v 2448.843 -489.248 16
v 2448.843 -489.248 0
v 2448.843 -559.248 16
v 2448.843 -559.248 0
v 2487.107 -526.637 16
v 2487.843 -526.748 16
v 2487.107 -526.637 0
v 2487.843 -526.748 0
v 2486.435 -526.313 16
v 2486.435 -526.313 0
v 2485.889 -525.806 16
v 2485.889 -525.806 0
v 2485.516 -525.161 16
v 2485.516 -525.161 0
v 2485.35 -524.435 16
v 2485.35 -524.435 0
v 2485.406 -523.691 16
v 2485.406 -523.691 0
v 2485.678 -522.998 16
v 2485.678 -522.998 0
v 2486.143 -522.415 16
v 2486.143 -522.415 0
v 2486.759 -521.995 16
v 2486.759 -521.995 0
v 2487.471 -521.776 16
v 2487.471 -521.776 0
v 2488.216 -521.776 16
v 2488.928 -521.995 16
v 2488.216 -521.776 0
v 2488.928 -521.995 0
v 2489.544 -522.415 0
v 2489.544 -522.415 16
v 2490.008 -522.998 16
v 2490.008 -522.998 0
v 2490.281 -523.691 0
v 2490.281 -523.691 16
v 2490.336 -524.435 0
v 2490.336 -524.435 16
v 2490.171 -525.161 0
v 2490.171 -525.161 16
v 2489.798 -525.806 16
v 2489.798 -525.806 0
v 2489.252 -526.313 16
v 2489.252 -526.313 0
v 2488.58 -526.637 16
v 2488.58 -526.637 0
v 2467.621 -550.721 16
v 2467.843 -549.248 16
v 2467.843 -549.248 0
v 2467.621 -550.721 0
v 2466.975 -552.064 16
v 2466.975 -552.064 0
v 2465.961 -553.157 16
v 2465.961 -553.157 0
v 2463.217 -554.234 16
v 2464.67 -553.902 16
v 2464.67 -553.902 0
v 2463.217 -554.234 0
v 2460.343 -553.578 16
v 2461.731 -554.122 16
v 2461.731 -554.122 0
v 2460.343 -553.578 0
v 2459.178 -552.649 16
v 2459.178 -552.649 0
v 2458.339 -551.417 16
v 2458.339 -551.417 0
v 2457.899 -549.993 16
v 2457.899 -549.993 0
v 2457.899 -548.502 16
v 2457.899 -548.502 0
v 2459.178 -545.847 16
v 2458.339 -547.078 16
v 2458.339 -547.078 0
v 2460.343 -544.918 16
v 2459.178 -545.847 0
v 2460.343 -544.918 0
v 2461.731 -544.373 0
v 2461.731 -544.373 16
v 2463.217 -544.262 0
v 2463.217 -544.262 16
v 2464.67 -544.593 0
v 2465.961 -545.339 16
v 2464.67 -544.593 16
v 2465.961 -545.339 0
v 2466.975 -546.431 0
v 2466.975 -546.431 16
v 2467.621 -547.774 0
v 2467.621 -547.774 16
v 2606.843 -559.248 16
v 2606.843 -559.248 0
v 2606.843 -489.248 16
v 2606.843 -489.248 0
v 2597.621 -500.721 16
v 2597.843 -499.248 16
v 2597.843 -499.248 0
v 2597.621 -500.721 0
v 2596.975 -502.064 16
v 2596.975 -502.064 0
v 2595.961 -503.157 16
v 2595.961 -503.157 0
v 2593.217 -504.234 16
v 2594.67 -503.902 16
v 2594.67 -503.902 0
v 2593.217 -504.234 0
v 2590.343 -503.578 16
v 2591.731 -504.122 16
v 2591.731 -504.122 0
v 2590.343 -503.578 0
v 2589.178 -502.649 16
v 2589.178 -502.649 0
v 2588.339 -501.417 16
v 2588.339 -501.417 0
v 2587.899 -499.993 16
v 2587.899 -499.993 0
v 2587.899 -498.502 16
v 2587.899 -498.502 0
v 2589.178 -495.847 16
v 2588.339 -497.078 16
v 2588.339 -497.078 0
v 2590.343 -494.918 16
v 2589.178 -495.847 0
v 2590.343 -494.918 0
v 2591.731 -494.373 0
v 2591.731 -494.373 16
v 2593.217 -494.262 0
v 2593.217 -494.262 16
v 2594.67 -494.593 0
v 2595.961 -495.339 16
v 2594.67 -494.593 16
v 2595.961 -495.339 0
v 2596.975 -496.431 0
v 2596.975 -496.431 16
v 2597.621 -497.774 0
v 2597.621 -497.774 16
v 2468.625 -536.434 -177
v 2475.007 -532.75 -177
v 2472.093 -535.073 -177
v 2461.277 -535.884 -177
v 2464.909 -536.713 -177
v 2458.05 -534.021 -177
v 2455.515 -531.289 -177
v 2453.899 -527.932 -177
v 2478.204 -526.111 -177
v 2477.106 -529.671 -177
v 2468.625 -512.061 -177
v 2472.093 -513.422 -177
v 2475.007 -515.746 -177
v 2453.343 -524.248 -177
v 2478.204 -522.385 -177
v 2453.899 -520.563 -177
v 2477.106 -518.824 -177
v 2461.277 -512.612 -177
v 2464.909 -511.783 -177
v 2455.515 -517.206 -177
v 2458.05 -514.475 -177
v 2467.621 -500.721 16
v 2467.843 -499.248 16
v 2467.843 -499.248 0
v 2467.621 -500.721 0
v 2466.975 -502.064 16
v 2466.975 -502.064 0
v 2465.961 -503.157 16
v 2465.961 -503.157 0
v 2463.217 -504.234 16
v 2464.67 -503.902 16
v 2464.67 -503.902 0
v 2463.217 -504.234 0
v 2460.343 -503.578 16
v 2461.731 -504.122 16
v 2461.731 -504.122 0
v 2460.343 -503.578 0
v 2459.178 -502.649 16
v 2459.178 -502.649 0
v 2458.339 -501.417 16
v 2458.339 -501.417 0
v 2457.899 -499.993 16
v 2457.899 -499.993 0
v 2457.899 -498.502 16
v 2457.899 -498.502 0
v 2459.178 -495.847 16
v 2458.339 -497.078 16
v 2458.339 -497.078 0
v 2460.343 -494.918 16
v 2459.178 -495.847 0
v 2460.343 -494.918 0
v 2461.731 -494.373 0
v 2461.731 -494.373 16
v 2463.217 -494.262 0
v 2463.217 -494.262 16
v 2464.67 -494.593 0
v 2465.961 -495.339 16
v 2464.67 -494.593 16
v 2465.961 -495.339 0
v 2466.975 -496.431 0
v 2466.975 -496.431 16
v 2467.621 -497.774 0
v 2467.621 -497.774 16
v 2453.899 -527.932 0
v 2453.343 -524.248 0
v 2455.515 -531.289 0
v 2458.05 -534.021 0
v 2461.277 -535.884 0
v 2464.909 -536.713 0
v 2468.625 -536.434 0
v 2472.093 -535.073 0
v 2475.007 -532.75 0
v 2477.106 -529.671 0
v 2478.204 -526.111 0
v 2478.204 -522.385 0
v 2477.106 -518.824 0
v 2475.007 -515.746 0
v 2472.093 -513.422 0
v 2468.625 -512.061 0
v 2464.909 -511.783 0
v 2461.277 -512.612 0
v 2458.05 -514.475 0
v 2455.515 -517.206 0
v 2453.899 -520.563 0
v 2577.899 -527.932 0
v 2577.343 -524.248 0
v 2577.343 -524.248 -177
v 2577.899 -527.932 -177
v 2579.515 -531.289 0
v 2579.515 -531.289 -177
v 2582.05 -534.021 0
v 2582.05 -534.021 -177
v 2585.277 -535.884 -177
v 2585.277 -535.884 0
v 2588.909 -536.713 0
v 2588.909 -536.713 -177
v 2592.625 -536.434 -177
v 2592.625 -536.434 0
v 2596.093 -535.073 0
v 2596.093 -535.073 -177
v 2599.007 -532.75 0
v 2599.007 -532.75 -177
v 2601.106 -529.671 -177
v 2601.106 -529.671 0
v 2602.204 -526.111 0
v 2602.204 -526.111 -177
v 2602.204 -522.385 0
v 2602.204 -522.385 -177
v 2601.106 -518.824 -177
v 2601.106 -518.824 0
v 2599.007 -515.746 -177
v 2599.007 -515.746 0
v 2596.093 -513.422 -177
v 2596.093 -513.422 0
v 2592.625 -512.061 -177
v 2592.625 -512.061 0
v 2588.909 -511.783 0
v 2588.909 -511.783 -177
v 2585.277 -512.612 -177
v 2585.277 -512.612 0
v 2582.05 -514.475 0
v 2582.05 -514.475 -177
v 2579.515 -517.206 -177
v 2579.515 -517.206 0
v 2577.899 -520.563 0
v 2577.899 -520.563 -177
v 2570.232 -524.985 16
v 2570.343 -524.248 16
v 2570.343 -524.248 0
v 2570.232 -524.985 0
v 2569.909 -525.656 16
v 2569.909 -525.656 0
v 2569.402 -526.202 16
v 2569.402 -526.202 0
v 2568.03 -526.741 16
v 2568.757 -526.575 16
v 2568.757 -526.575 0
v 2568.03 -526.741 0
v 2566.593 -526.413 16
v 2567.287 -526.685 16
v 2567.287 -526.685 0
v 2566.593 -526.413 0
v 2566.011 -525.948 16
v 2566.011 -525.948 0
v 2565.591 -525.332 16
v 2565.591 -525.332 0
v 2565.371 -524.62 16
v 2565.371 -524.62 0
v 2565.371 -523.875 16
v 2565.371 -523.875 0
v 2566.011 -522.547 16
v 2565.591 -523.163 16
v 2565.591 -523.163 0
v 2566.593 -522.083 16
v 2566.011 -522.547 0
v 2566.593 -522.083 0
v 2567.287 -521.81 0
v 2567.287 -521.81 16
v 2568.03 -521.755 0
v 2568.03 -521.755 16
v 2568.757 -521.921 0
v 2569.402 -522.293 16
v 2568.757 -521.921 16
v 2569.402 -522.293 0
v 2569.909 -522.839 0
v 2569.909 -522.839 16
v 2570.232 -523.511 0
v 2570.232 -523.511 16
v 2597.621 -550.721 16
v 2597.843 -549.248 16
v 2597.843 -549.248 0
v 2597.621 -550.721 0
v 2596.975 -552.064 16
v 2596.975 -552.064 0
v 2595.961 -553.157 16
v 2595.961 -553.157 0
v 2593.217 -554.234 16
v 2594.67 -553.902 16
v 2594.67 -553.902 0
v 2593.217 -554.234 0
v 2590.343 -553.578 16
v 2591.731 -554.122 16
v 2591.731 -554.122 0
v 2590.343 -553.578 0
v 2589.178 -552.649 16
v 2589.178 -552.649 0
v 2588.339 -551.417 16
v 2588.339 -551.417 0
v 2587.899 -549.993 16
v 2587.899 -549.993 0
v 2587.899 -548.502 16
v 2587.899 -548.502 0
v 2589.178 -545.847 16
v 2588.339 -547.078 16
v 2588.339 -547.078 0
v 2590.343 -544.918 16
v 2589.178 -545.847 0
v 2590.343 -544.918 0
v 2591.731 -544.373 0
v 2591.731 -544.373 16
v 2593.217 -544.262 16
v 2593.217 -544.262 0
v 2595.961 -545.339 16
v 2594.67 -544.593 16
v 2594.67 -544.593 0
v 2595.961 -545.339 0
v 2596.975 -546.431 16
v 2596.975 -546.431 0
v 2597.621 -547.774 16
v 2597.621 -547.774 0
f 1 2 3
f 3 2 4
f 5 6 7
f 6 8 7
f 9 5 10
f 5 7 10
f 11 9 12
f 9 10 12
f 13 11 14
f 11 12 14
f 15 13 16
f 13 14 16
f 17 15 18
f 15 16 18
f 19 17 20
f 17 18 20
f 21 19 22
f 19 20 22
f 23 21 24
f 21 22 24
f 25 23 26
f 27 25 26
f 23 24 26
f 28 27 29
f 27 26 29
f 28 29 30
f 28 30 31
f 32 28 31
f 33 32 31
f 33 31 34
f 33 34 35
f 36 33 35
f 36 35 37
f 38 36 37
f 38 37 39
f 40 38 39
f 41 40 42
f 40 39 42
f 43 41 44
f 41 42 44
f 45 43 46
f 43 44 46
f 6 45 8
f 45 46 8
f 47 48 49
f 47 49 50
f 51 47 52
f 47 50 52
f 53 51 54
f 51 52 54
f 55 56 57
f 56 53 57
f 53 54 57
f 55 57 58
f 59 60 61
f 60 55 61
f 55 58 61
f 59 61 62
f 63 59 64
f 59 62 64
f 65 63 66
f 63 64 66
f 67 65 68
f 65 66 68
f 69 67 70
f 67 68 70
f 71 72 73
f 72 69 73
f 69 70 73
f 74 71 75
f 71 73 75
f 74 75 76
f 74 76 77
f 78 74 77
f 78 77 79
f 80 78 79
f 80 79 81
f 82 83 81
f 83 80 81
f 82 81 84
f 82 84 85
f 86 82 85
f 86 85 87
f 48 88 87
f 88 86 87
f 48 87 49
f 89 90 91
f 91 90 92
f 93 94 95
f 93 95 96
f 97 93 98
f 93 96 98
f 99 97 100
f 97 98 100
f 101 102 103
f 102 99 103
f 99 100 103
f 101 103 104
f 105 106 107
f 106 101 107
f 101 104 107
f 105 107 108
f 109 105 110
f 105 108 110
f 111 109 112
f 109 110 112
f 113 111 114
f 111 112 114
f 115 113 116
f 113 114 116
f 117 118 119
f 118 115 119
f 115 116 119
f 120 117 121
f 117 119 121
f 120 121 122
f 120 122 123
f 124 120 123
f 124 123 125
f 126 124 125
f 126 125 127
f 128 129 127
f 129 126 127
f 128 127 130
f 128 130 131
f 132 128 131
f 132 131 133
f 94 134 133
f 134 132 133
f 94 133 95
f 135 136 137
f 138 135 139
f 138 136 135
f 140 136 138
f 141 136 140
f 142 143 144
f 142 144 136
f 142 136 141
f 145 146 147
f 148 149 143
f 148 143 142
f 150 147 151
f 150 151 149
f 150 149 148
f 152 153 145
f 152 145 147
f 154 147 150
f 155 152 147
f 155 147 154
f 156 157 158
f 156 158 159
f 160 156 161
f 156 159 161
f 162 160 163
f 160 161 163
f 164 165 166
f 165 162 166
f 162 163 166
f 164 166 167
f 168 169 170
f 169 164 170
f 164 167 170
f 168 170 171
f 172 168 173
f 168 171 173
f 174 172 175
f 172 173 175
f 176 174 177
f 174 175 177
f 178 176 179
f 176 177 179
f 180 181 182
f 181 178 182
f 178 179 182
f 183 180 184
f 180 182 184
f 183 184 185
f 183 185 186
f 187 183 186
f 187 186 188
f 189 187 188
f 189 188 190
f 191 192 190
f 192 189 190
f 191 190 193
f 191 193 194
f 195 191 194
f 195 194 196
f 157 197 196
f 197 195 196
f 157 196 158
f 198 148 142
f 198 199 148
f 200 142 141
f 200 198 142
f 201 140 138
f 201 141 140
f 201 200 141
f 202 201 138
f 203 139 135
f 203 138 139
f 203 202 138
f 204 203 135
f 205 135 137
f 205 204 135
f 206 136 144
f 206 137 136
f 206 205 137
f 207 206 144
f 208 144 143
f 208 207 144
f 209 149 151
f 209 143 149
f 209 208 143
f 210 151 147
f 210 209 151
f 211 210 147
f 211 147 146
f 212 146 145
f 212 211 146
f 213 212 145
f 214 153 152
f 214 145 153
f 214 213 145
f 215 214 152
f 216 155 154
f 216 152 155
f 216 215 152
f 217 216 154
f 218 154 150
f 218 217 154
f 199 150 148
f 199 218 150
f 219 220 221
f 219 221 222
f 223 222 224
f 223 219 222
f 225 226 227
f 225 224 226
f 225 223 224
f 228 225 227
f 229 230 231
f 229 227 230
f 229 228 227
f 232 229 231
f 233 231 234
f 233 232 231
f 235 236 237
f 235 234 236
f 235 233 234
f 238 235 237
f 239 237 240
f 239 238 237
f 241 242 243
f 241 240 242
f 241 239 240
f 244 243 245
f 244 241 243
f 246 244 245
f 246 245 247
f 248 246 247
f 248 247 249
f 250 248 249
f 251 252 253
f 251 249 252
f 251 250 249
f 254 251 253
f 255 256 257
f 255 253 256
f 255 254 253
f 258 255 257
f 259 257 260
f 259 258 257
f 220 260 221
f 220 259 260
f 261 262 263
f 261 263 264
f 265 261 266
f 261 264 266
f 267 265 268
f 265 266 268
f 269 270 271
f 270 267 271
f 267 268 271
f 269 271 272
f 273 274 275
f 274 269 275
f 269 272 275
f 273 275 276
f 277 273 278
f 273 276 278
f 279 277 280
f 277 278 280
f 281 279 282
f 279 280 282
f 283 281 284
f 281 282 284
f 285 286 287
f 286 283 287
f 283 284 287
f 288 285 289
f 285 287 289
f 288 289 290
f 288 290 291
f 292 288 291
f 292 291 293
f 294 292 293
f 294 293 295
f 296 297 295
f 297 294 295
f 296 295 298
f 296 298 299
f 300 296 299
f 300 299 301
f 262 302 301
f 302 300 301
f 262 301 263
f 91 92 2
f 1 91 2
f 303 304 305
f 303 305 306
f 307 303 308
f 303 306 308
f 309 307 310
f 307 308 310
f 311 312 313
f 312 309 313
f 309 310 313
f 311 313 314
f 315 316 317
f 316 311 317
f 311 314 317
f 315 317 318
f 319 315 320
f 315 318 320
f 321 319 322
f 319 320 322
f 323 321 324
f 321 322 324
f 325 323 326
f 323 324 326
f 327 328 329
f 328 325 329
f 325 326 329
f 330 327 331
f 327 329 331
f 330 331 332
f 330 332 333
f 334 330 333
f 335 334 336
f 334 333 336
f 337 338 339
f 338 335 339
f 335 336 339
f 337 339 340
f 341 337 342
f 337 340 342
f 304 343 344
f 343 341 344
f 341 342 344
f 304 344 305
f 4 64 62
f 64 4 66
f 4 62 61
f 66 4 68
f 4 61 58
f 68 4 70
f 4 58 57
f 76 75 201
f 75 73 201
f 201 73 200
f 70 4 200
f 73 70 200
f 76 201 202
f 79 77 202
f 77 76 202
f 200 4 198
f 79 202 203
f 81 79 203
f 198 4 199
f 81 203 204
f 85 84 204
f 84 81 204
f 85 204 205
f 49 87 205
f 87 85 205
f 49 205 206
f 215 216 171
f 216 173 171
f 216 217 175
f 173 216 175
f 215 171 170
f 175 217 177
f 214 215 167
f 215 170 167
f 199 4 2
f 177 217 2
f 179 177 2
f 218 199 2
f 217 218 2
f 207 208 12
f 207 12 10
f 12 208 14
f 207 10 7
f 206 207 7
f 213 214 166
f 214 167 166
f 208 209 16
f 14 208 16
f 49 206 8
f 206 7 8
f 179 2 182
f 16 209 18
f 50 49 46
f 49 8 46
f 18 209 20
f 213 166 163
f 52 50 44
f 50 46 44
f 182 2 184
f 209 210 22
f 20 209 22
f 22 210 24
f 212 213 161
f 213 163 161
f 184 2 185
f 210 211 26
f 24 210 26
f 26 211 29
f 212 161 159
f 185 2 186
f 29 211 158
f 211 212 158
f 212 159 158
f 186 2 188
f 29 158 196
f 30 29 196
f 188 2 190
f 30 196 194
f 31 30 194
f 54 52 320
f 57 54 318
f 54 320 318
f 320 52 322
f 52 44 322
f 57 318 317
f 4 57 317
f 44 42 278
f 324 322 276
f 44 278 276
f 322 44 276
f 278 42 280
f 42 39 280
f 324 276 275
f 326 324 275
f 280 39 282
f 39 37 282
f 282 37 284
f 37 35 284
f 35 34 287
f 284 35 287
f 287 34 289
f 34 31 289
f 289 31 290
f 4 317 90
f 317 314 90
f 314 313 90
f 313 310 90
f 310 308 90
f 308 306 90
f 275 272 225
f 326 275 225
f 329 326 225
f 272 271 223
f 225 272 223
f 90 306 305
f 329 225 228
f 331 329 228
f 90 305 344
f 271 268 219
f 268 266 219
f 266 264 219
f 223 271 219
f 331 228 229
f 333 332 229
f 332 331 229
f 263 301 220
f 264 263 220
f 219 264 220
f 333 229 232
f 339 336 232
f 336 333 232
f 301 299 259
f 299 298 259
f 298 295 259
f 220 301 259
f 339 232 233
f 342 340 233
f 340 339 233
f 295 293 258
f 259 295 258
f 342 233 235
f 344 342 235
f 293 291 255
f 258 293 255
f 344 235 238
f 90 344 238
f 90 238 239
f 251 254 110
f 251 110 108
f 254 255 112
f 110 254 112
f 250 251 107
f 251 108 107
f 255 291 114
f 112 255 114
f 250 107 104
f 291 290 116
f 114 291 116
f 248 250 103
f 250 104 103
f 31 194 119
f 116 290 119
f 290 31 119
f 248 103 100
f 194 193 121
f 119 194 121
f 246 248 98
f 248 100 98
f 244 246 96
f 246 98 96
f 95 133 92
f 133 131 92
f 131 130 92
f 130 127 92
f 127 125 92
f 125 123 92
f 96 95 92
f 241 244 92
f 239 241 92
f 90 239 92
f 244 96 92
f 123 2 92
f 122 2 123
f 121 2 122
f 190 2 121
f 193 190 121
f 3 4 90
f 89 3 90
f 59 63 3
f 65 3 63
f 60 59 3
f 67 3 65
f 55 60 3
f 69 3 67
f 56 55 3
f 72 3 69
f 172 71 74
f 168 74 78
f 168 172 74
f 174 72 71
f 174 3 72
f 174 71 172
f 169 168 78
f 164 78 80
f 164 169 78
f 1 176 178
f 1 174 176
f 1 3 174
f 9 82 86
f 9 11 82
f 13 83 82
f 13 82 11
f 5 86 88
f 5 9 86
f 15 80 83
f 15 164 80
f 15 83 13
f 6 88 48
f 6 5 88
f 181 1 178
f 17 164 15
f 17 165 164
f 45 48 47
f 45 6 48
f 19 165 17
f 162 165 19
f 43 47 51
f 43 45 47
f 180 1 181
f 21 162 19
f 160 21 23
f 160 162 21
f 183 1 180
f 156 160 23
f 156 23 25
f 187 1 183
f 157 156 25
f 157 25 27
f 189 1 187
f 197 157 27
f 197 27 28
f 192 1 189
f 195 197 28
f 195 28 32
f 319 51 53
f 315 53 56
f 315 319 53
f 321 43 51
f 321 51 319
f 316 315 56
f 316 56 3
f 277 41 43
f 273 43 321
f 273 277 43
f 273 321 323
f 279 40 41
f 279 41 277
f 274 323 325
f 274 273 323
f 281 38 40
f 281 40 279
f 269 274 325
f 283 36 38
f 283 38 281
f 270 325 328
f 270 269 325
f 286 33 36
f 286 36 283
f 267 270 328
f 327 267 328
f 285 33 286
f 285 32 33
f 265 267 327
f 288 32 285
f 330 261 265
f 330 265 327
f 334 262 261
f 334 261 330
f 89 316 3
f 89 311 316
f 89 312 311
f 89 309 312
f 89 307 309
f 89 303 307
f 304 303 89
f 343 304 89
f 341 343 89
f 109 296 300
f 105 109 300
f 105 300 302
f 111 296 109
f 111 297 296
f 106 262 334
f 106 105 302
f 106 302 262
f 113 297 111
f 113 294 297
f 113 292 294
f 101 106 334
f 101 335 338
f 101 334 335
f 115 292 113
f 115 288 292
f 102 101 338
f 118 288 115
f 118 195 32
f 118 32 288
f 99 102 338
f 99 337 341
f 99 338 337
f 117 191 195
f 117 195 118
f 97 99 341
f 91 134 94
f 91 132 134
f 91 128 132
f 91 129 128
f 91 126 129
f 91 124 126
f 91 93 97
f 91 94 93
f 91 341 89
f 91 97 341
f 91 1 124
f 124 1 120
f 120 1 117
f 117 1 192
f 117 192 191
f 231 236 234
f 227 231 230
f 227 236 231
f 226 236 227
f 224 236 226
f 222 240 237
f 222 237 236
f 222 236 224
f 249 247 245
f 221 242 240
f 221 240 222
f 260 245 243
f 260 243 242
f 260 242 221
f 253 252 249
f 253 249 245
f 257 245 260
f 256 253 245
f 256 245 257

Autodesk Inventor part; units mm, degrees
ref_plane "YZ Plane" through (0, 0, 0) normal (1, 0, 0) x (0, 1, 0)
ref_plane "XZ Plane" through (0, 0, 0) normal (0, 1, 0) x (-1, 0, 0)
ref_plane "XY Plane" through (0, 0, 0) normal (0, 0, 1) x (1, 0, 0)
sketch "Sketch1" plane through (0, 0, 0) normal (0, 0, 1) x (1, 0, 0)
  line L0 (2448.8434, -559.2477) -> (2606.8434, -559.2477)
  line L1 (2606.8434, -489.2477) -> (2448.8434, -489.2477)
  line L2 (2448.8434, -489.2477) -> (2448.8434, -559.2477)
  circle A0 centre (2462.8434, -549.2477) radius 5
  arc A1 (2487.8434, -526.7477) -> (2487.8434, -521.7477) centre (2487.8434, -524.2477) ccw
  arc A2 (2487.8434, -521.7477) -> (2487.8434, -526.7477) centre (2487.8434, -524.2477) ccw
  line L3 (2487.3434, -526.7477) -> (2488.3434, -526.7477)
  line L4 (2488.3434, -521.7477) -> (2487.3434, -521.7477)
  circle A3 centre (2462.8434, -499.2477) radius 5
  line L5 (2606.8434, -559.2477) -> (2606.8434, -489.2477)
  circle A4 centre (2592.8434, -549.2477) radius 5
  circle A5 centre (2592.8434, -499.2477) radius 5
  circle A6 centre (2567.8434, -524.2477) radius 2.5
  point P0 (0, 0)
extrude "Extrusion1" add sketch "Sketch1" along normal blind 16
sketch "Sketch2" plane through (0, 0, 0) normal (0, 0, -1) x (-1, 0, 0)
  circle A0 centre (-2487.8434, -524.2477) radius 2.5
  circle A1 centre (-2567.8434, -524.2477) radius 2.5
  circle A2 centre (-2589.8434, -524.2477) radius 12.5
  circle A3 centre (-2465.8434, -524.2477) radius 12.5
  line L0 (-2527.8434, -524.2477) -> (-2527.8434, -513.4708)
  point P0 (0, 0)
  dimension "d2" = 25
  dimension "d3" = 25
  dimension "d8" = 124
  dimension "d9" = 62
extrude "Extrusion2" add sketch "Sketch2" along normal blind 177 contours A2 | A3
properties part number "ADSK-MH-10030" material "Aluminum 6061"
